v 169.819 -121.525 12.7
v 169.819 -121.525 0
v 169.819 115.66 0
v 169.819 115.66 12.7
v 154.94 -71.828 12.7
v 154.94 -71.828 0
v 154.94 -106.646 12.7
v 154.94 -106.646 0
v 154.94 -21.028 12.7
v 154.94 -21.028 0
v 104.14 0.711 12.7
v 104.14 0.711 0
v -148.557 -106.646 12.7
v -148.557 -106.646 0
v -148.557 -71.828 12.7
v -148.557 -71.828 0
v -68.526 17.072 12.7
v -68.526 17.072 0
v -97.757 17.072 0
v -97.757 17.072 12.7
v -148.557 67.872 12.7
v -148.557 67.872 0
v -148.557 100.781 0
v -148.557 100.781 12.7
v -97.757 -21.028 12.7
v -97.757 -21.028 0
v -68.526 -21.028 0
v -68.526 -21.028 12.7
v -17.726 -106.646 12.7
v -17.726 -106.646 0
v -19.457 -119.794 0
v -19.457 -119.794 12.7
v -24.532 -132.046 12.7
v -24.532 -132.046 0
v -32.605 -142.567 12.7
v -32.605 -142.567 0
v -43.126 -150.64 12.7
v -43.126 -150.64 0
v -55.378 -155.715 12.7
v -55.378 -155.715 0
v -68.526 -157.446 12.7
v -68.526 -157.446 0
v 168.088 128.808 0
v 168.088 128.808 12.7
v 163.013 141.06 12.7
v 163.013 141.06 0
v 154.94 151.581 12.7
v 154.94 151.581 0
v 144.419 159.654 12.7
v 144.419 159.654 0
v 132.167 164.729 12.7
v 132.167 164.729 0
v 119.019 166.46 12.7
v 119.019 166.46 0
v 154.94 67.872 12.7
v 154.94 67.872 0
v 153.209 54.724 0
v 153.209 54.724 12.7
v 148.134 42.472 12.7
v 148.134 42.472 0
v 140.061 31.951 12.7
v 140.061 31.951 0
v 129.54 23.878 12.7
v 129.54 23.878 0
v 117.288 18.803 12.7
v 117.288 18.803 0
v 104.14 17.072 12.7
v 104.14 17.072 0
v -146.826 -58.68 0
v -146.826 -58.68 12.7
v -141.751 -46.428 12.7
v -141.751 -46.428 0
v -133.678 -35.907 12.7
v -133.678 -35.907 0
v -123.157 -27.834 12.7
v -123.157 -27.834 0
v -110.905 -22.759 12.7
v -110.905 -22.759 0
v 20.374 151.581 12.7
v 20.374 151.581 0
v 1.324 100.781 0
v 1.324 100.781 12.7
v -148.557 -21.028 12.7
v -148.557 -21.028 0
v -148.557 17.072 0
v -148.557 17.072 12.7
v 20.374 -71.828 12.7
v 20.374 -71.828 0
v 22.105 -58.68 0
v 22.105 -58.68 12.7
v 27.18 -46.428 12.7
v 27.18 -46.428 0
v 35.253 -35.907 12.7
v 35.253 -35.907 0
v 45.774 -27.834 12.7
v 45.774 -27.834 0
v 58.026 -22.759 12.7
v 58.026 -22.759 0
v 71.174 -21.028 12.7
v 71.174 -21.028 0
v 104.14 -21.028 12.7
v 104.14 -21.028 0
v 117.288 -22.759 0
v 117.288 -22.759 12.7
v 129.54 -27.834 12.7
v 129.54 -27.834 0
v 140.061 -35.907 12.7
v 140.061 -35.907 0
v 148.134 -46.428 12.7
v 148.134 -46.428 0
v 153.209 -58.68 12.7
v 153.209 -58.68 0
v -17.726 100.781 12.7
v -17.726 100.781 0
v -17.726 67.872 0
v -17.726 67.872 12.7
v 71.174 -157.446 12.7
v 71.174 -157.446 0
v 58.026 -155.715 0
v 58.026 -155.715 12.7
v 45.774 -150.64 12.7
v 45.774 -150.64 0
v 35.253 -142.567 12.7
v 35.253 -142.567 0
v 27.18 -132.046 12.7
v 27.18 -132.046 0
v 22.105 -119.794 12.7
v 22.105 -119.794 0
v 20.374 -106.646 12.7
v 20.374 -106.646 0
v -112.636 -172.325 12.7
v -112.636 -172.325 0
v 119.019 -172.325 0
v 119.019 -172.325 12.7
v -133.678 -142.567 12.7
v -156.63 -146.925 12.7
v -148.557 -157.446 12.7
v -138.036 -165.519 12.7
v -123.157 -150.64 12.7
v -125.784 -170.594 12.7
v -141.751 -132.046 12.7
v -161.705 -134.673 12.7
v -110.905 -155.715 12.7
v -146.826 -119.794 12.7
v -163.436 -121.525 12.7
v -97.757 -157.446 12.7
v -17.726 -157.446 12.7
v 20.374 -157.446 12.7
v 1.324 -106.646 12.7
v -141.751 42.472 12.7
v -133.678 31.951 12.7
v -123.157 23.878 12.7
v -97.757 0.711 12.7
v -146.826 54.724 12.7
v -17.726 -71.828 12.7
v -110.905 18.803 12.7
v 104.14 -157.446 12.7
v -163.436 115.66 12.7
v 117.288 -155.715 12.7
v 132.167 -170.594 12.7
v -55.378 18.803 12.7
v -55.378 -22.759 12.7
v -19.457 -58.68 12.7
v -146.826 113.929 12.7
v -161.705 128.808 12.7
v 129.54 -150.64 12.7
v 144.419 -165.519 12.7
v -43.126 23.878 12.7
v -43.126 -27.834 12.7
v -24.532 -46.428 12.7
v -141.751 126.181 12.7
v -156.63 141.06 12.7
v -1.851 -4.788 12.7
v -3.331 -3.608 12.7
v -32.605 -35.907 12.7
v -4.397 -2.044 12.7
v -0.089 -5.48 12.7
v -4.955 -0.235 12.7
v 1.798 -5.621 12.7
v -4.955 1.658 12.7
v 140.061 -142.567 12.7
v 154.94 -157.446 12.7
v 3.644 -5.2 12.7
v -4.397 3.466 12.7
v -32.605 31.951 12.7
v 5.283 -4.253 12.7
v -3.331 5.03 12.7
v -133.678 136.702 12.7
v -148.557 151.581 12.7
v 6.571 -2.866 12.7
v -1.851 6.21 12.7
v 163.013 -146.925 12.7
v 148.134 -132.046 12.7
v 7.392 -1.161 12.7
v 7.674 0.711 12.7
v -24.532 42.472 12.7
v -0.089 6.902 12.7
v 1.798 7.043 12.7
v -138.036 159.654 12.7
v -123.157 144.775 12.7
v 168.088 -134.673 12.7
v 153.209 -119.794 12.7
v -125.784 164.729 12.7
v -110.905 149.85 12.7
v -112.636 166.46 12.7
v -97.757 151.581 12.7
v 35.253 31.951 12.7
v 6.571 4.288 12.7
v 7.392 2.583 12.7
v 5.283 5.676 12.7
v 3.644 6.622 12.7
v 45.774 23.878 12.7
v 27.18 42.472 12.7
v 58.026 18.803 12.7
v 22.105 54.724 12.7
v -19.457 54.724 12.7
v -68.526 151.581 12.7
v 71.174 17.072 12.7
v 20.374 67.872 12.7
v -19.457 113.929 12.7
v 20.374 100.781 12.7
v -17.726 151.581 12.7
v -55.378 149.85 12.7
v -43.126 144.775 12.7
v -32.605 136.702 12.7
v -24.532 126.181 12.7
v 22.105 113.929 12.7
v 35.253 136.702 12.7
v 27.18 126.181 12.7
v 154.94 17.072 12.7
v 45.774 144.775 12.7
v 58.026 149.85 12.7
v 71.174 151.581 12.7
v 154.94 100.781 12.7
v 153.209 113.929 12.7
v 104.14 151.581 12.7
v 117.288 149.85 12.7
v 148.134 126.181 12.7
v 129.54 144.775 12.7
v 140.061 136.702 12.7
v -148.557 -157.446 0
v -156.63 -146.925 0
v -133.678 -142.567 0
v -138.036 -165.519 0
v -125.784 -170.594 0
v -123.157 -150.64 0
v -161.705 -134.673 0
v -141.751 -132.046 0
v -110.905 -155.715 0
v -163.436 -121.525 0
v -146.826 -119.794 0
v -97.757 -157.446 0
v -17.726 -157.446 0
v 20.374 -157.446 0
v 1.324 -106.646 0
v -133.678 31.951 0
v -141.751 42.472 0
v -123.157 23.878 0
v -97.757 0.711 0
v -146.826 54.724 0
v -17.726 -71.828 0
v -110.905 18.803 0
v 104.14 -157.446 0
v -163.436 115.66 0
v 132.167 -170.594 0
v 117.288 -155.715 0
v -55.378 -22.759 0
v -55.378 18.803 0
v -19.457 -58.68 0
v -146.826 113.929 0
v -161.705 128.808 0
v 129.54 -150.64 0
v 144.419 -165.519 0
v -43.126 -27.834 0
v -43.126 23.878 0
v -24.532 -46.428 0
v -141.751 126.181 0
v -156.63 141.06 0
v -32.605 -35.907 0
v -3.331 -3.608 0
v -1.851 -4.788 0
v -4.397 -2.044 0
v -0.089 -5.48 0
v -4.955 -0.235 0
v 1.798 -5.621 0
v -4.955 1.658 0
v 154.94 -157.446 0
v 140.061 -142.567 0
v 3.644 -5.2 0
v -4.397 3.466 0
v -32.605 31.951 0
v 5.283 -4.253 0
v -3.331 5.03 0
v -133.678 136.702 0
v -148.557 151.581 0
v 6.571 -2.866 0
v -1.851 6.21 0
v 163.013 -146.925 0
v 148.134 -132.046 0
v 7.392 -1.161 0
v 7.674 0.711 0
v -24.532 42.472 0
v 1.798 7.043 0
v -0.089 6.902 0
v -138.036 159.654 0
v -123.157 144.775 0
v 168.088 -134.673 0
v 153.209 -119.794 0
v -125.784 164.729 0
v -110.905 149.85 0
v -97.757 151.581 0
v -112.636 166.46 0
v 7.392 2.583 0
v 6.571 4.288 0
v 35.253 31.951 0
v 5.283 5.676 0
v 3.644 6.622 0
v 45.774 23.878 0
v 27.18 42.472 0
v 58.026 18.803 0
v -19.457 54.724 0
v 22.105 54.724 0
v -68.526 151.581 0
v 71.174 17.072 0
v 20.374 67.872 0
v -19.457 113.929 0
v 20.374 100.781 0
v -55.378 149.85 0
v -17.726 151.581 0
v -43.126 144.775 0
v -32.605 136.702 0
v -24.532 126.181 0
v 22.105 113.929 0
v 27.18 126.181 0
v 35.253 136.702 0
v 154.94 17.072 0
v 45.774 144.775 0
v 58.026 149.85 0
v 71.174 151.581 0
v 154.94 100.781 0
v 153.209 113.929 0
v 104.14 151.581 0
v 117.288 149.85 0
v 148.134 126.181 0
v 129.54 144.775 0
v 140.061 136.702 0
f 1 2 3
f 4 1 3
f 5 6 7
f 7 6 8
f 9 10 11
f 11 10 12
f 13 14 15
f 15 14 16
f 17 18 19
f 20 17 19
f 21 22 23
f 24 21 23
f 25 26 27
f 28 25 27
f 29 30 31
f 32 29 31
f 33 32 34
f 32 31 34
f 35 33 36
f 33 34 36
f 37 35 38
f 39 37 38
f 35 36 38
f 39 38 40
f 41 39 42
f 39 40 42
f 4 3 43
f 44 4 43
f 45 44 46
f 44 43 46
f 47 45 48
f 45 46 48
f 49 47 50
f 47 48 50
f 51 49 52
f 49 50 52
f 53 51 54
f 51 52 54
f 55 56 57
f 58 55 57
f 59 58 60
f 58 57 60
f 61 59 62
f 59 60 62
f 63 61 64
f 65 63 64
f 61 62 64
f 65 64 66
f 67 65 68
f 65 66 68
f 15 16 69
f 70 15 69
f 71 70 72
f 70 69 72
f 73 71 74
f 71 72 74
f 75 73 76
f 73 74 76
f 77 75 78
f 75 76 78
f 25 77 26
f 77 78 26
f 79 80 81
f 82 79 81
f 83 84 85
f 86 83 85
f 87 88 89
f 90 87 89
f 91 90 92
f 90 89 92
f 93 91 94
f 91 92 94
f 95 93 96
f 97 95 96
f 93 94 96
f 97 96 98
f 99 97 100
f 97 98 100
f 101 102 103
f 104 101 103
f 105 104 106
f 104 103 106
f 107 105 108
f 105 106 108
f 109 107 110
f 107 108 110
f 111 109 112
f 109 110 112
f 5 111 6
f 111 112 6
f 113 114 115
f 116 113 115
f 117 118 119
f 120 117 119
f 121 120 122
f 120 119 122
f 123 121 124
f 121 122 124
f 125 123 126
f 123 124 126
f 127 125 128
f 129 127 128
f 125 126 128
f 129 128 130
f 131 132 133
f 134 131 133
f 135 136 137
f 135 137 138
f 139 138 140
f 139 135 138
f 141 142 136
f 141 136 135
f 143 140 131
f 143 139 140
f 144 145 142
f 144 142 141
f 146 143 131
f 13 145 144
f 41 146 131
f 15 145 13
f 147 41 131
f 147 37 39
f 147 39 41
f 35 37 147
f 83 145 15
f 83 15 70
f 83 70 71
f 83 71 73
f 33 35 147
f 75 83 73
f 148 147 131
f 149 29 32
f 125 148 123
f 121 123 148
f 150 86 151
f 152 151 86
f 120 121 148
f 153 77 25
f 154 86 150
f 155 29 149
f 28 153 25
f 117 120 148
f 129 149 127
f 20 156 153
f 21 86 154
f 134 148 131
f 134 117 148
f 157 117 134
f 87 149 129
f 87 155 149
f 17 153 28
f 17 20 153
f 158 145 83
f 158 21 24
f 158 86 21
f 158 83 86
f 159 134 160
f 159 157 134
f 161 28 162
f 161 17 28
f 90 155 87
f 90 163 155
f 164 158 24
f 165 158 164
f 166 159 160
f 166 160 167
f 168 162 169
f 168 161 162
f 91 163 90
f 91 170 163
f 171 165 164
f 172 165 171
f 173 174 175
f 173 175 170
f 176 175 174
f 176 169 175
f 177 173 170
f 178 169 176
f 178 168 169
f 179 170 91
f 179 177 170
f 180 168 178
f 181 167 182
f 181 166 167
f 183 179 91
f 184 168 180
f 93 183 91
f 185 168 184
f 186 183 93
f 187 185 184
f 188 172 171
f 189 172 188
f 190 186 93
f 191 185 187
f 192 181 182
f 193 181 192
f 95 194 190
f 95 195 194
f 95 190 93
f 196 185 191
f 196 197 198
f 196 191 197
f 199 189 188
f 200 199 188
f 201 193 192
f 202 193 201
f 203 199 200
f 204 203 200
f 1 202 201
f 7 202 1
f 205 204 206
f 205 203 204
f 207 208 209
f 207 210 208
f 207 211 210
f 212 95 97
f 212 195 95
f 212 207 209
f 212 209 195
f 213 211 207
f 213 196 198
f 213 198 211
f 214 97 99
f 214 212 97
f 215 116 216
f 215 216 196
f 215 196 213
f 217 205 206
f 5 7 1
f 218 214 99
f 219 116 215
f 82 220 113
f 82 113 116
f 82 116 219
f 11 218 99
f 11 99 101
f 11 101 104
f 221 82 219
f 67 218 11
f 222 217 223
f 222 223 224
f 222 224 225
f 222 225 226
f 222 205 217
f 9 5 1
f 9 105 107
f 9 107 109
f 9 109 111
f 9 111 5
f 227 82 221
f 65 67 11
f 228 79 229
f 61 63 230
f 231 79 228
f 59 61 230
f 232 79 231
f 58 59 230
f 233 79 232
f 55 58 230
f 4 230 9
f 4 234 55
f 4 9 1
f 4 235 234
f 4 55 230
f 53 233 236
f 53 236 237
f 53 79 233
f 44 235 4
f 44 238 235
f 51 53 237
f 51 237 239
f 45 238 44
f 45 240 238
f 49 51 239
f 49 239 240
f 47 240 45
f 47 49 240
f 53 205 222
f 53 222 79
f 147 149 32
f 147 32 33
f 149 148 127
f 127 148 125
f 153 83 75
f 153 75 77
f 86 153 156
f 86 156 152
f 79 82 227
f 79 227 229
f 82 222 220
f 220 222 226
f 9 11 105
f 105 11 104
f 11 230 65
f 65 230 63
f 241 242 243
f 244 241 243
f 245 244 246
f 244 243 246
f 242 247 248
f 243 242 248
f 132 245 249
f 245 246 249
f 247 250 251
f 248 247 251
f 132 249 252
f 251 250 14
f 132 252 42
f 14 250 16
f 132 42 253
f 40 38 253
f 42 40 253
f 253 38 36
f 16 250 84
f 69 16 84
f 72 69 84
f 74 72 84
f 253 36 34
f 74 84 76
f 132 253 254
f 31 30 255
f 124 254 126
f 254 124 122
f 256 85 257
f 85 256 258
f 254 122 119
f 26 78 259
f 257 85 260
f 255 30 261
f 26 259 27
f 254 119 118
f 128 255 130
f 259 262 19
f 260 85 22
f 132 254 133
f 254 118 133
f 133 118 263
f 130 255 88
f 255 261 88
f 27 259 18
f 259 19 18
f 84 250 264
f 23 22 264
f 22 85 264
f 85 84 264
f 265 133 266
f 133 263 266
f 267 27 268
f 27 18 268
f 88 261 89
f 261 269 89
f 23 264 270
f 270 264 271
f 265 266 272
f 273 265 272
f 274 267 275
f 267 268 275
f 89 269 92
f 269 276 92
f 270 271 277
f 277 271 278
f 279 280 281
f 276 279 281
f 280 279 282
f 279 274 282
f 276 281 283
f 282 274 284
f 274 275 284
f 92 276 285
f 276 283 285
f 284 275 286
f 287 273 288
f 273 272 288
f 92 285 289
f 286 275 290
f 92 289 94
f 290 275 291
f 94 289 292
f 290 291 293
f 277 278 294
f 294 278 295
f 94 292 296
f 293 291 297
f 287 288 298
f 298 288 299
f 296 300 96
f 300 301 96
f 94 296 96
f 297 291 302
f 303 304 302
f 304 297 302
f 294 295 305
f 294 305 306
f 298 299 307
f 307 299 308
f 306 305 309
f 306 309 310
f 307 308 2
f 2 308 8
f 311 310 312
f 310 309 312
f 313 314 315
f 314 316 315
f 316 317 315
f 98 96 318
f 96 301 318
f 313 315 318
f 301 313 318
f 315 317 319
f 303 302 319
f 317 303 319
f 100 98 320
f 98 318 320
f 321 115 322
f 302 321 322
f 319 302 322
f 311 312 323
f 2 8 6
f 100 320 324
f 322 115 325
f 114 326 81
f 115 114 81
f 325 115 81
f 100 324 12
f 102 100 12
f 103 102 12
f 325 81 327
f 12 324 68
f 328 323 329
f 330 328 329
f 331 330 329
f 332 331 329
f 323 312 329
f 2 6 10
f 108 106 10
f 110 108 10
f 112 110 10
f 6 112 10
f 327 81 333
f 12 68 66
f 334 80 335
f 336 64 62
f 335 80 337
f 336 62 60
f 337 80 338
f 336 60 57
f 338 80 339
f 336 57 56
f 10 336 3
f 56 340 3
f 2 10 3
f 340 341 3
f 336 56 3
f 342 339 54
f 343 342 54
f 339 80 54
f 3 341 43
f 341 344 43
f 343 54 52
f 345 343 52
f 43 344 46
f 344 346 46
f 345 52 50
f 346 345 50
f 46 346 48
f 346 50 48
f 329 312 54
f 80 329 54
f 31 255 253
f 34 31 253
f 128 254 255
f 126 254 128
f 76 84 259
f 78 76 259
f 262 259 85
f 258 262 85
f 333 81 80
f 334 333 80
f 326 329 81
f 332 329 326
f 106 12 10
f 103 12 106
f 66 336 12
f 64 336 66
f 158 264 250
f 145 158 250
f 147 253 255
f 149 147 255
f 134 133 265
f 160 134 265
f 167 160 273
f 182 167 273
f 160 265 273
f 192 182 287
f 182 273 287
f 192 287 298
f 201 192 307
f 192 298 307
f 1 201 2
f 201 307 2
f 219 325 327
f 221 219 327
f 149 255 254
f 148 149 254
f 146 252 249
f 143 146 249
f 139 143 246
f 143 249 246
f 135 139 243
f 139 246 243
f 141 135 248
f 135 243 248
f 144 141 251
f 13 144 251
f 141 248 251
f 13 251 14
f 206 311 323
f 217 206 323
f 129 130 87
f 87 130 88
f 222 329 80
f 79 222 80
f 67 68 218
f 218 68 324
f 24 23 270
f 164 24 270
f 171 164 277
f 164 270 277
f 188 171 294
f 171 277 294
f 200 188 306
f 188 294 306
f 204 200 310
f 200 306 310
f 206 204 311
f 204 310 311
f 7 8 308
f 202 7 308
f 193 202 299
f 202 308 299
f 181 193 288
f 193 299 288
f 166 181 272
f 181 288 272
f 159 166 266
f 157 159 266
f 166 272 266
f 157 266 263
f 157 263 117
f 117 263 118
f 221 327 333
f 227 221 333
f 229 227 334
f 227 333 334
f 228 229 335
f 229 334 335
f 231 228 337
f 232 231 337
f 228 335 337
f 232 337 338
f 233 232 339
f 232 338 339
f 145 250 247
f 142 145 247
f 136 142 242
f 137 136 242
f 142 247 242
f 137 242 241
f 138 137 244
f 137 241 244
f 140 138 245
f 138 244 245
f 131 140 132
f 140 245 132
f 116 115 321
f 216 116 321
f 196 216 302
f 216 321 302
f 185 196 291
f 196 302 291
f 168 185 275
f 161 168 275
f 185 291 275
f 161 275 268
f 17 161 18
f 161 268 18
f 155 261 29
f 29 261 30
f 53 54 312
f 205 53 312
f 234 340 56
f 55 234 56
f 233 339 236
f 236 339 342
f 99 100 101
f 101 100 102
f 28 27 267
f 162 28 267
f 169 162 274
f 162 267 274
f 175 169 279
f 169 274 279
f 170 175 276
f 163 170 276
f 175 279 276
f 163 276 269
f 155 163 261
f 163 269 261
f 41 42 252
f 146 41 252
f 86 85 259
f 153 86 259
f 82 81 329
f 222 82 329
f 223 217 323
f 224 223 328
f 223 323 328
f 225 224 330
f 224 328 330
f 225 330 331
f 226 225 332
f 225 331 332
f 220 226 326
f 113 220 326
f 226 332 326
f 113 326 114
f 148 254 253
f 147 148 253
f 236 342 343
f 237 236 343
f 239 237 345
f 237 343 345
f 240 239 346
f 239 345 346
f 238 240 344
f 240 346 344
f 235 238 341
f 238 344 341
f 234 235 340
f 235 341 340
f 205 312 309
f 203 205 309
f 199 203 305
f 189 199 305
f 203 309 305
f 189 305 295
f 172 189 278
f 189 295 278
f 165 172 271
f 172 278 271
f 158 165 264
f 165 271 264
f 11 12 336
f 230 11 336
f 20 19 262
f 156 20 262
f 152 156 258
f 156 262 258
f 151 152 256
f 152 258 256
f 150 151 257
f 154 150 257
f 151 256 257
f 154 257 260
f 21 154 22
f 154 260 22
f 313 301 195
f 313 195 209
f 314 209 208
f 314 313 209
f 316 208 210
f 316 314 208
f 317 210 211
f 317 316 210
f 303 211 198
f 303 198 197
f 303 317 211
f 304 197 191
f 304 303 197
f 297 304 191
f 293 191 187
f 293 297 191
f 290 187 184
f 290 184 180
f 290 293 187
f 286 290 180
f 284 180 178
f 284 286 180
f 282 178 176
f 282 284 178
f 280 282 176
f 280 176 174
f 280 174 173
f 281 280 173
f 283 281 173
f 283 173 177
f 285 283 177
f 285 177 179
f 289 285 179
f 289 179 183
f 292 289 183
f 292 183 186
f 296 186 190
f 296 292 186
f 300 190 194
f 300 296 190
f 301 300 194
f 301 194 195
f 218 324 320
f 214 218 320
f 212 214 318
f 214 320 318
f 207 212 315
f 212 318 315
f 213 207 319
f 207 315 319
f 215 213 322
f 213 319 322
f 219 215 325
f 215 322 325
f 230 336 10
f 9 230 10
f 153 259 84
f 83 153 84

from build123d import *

# Parameters (mm, degrees)
F0_R     = 6.35
F1_DEPTH = 12.7
F3_R     = 6.35
F4_DEPTH = 12.7


with BuildPart() as f1:
    # F0 (on Top) → F1 (new body)
    with BuildSketch(Plane.XY):
        with BuildLine():
            ThreePointArc((-163.4358839095, -121.5245512031), (-148.5569083937, -157.4455756873), (-112.6358839095, -172.3245512031))
            Line((-112.6358839095, -172.3245512031), (119.0192133605, -172.3245512031))
            ThreePointArc((119.0192133605, -172.3245512031), (154.9402378448, -157.4455756873), (169.8192133605, -121.5245512031))
            Line((169.8192133605, -121.5245512031), (169.8192133605, 115.6596517303))
            ThreePointArc((169.8192133605, 115.6596517303), (154.9402378448, 151.5806762145), (119.0192133605, 166.4596517303))
            Line((119.0192133605, 166.4596517303), (-112.6358839095, 166.4596517303))
            ThreePointArc((-112.6358839095, 166.4596517303), (-148.5569083937, 151.5806762145), (-163.4358839095, 115.6596517303))
            Line((-163.4358839095, 115.6596517303), (-163.4358839095, -121.5245512031))
        make_face()
        Polygon((-17.7260840714, -157.4455756873), (1.3239159286, -106.6455756873), (20.3739159286, -157.4455756873), align=None, mode=Mode.SUBTRACT)
        Polygon((-148.5569083937, -21.0277362994), (-148.5569083937, 17.0722637006), (-97.7569083937, 0.7111747481), align=None, mode=Mode.SUBTRACT)
        with Locations((1.3239159286, 0.7111747481)):
            Circle(F0_R, mode=Mode.SUBTRACT)
        Polygon((20.3739159286, 151.5806762145), (1.3239159286, 100.7806762145), (-17.7260840714, 151.5806762145), align=None, mode=Mode.SUBTRACT)
        Polygon((154.9402378448, -21.0277362994), (104.1402378448, 0.7111747481), (154.9402378448, 17.0722637006), align=None, mode=Mode.SUBTRACT)
    extrude(amount=F1_DEPTH)


with BuildPart() as f4:
    # F3 (on Top) → F4 (new body)
    with BuildSketch(Plane.XY):
        with BuildLine():
            ThreePointArc((-163.4358839095, -121.5245512031), (-148.5569083937, -157.4455756873), (-112.6358839095, -172.3245512031))
            Line((-112.6358839095, -172.3245512031), (119.0192133605, -172.3245512031))
            ThreePointArc((119.0192133605, -172.3245512031), (154.9402378448, -157.4455756873), (169.8192133605, -121.5245512031))
            Line((169.8192133605, -121.5245512031), (169.8192133605, 115.6596517303))
            ThreePointArc((169.8192133605, 115.6596517303), (154.9402378448, 151.5806762145), (119.0192133605, 166.4596517303))
            Line((119.0192133605, 166.4596517303), (-112.6358839095, 166.4596517303))
            ThreePointArc((-112.6358839095, 166.4596517303), (-148.5569083937, 151.5806762145), (-163.4358839095, 115.6596517303))
            Line((-163.4358839095, 115.6596517303), (-163.4358839095, -121.5245512031))
        make_face()
        with BuildLine():
            ThreePointArc((-68.5260840714, -21.0277362994), (-32.6050595871, -35.9067118152), (-17.7260840714, -71.8277362994))
            Line((-17.7260840714, -71.8277362994), (-17.7260840714, -106.6455756873))
            ThreePointArc((-17.7260840714, -106.6455756873), (-32.6050595871, -142.5666001716), (-68.5260840714, -157.4455756873))
            Line((-68.5260840714, -157.4455756873), (-97.7569083937, -157.4455756873))
            ThreePointArc((-97.7569083937, -157.4455756873), (-133.677932878, -142.5666001716), (-148.5569083937, -106.6455756873))
            Line((-148.5569083937, -106.6455756873), (-148.5569083937, -71.8277362994))
            ThreePointArc((-148.5569083937, -71.8277362994), (-133.677932878, -35.9067118152), (-97.7569083937, -21.0277362994))
            Line((-97.7569083937, -21.0277362994), (-68.5260840714, -21.0277362994))
        make_face(mode=Mode.SUBTRACT)
        Polygon((-17.7260840714, -157.4455756873), (1.3239159286, -106.6455756873), (20.3739159286, -157.4455756873), align=None, mode=Mode.SUBTRACT)
        with BuildLine():
            Line((71.1739159286, -21.0277362994), (104.1402378448, -21.0277362994))
            ThreePointArc((104.1402378448, -21.0277362994), (140.0612623291, -35.9067118152), (154.9402378448, -71.8277362994))
            Line((154.9402378448, -71.8277362994), (154.9402378448, -106.6455756873))
            ThreePointArc((154.9402378448, -106.6455756873), (140.0612623291, -142.5666001716), (104.1402378448, -157.4455756873))
            Line((104.1402378448, -157.4455756873), (71.1739159286, -157.4455756873))
            ThreePointArc((71.1739159286, -157.4455756873), (35.2528914443, -142.5666001716), (20.3739159286, -106.6455756873))
            Line((20.3739159286, -106.6455756873), (20.3739159286, -71.8277362994))
            ThreePointArc((20.3739159286, -71.8277362994), (35.2528914443, -35.9067118152), (71.1739159286, -21.0277362994))
        make_face(mode=Mode.SUBTRACT)
        Polygon((-148.5569083937, -21.0277362994), (-148.5569083937, 17.0722637006), (-97.7569083937, 0.7111747481), align=None, mode=Mode.SUBTRACT)
        with Locations((1.3239159286, 0.7111747481)):
            Circle(F3_R, mode=Mode.SUBTRACT)
        with BuildLine():
            ThreePointArc((-68.5260840714, 151.5806762145), (-32.6050595871, 136.7017006988), (-17.7260840714, 100.7806762145))
            Line((-17.7260840714, 100.7806762145), (-17.7260840714, 67.8722637006))
            ThreePointArc((-17.7260840714, 67.8722637006), (-32.6050595871, 31.9512392163), (-68.5260840714, 17.0722637006))
            Line((-68.5260840714, 17.0722637006), (-97.7569083937, 17.0722637006))
            ThreePointArc((-97.7569083937, 17.0722637006), (-133.677932878, 31.9512392163), (-148.5569083937, 67.8722637006))
            Line((-148.5569083937, 67.8722637006), (-148.5569083937, 100.7806762145))
            ThreePointArc((-148.5569083937, 100.7806762145), (-133.677932878, 136.7017006988), (-97.7569083937, 151.5806762145))
            Line((-97.7569083937, 151.5806762145), (-68.5260840714, 151.5806762145))
        make_face(mode=Mode.SUBTRACT)
        Polygon((20.3739159286, 151.5806762145), (1.3239159286, 100.7806762145), (-17.7260840714, 151.5806762145), align=None, mode=Mode.SUBTRACT)
        Polygon((154.9402378448, -21.0277362994), (104.1402378448, 0.7111747481), (154.9402378448, 17.0722637006), align=None, mode=Mode.SUBTRACT)
        with BuildLine():
            ThreePointArc((154.9402378448, 67.8722637006), (140.0612623291, 31.9512392163), (104.1402378448, 17.0722637006))
            Line((104.1402378448, 17.0722637006), (71.1739159286, 17.0722637006))
            ThreePointArc((71.1739159286, 17.0722637006), (35.2528914443, 31.9512392163), (20.3739159286, 67.8722637006))
            Line((20.3739159286, 67.8722637006), (20.3739159286, 100.7806762145))
            ThreePointArc((20.3739159286, 100.7806762145), (35.2528914443, 136.7017006988), (71.1739159286, 151.5806762145))
            Line((71.1739159286, 151.5806762145), (104.1402378448, 151.5806762145))
            ThreePointArc((104.1402378448, 151.5806762145), (140.0612623291, 136.7017006988), (154.9402378448, 100.7806762145))
            Line((154.9402378448, 100.7806762145), (154.9402378448, 67.8722637006))
        make_face(mode=Mode.SUBTRACT)
    extrude(amount=F4_DEPTH)


solid = f4.part
